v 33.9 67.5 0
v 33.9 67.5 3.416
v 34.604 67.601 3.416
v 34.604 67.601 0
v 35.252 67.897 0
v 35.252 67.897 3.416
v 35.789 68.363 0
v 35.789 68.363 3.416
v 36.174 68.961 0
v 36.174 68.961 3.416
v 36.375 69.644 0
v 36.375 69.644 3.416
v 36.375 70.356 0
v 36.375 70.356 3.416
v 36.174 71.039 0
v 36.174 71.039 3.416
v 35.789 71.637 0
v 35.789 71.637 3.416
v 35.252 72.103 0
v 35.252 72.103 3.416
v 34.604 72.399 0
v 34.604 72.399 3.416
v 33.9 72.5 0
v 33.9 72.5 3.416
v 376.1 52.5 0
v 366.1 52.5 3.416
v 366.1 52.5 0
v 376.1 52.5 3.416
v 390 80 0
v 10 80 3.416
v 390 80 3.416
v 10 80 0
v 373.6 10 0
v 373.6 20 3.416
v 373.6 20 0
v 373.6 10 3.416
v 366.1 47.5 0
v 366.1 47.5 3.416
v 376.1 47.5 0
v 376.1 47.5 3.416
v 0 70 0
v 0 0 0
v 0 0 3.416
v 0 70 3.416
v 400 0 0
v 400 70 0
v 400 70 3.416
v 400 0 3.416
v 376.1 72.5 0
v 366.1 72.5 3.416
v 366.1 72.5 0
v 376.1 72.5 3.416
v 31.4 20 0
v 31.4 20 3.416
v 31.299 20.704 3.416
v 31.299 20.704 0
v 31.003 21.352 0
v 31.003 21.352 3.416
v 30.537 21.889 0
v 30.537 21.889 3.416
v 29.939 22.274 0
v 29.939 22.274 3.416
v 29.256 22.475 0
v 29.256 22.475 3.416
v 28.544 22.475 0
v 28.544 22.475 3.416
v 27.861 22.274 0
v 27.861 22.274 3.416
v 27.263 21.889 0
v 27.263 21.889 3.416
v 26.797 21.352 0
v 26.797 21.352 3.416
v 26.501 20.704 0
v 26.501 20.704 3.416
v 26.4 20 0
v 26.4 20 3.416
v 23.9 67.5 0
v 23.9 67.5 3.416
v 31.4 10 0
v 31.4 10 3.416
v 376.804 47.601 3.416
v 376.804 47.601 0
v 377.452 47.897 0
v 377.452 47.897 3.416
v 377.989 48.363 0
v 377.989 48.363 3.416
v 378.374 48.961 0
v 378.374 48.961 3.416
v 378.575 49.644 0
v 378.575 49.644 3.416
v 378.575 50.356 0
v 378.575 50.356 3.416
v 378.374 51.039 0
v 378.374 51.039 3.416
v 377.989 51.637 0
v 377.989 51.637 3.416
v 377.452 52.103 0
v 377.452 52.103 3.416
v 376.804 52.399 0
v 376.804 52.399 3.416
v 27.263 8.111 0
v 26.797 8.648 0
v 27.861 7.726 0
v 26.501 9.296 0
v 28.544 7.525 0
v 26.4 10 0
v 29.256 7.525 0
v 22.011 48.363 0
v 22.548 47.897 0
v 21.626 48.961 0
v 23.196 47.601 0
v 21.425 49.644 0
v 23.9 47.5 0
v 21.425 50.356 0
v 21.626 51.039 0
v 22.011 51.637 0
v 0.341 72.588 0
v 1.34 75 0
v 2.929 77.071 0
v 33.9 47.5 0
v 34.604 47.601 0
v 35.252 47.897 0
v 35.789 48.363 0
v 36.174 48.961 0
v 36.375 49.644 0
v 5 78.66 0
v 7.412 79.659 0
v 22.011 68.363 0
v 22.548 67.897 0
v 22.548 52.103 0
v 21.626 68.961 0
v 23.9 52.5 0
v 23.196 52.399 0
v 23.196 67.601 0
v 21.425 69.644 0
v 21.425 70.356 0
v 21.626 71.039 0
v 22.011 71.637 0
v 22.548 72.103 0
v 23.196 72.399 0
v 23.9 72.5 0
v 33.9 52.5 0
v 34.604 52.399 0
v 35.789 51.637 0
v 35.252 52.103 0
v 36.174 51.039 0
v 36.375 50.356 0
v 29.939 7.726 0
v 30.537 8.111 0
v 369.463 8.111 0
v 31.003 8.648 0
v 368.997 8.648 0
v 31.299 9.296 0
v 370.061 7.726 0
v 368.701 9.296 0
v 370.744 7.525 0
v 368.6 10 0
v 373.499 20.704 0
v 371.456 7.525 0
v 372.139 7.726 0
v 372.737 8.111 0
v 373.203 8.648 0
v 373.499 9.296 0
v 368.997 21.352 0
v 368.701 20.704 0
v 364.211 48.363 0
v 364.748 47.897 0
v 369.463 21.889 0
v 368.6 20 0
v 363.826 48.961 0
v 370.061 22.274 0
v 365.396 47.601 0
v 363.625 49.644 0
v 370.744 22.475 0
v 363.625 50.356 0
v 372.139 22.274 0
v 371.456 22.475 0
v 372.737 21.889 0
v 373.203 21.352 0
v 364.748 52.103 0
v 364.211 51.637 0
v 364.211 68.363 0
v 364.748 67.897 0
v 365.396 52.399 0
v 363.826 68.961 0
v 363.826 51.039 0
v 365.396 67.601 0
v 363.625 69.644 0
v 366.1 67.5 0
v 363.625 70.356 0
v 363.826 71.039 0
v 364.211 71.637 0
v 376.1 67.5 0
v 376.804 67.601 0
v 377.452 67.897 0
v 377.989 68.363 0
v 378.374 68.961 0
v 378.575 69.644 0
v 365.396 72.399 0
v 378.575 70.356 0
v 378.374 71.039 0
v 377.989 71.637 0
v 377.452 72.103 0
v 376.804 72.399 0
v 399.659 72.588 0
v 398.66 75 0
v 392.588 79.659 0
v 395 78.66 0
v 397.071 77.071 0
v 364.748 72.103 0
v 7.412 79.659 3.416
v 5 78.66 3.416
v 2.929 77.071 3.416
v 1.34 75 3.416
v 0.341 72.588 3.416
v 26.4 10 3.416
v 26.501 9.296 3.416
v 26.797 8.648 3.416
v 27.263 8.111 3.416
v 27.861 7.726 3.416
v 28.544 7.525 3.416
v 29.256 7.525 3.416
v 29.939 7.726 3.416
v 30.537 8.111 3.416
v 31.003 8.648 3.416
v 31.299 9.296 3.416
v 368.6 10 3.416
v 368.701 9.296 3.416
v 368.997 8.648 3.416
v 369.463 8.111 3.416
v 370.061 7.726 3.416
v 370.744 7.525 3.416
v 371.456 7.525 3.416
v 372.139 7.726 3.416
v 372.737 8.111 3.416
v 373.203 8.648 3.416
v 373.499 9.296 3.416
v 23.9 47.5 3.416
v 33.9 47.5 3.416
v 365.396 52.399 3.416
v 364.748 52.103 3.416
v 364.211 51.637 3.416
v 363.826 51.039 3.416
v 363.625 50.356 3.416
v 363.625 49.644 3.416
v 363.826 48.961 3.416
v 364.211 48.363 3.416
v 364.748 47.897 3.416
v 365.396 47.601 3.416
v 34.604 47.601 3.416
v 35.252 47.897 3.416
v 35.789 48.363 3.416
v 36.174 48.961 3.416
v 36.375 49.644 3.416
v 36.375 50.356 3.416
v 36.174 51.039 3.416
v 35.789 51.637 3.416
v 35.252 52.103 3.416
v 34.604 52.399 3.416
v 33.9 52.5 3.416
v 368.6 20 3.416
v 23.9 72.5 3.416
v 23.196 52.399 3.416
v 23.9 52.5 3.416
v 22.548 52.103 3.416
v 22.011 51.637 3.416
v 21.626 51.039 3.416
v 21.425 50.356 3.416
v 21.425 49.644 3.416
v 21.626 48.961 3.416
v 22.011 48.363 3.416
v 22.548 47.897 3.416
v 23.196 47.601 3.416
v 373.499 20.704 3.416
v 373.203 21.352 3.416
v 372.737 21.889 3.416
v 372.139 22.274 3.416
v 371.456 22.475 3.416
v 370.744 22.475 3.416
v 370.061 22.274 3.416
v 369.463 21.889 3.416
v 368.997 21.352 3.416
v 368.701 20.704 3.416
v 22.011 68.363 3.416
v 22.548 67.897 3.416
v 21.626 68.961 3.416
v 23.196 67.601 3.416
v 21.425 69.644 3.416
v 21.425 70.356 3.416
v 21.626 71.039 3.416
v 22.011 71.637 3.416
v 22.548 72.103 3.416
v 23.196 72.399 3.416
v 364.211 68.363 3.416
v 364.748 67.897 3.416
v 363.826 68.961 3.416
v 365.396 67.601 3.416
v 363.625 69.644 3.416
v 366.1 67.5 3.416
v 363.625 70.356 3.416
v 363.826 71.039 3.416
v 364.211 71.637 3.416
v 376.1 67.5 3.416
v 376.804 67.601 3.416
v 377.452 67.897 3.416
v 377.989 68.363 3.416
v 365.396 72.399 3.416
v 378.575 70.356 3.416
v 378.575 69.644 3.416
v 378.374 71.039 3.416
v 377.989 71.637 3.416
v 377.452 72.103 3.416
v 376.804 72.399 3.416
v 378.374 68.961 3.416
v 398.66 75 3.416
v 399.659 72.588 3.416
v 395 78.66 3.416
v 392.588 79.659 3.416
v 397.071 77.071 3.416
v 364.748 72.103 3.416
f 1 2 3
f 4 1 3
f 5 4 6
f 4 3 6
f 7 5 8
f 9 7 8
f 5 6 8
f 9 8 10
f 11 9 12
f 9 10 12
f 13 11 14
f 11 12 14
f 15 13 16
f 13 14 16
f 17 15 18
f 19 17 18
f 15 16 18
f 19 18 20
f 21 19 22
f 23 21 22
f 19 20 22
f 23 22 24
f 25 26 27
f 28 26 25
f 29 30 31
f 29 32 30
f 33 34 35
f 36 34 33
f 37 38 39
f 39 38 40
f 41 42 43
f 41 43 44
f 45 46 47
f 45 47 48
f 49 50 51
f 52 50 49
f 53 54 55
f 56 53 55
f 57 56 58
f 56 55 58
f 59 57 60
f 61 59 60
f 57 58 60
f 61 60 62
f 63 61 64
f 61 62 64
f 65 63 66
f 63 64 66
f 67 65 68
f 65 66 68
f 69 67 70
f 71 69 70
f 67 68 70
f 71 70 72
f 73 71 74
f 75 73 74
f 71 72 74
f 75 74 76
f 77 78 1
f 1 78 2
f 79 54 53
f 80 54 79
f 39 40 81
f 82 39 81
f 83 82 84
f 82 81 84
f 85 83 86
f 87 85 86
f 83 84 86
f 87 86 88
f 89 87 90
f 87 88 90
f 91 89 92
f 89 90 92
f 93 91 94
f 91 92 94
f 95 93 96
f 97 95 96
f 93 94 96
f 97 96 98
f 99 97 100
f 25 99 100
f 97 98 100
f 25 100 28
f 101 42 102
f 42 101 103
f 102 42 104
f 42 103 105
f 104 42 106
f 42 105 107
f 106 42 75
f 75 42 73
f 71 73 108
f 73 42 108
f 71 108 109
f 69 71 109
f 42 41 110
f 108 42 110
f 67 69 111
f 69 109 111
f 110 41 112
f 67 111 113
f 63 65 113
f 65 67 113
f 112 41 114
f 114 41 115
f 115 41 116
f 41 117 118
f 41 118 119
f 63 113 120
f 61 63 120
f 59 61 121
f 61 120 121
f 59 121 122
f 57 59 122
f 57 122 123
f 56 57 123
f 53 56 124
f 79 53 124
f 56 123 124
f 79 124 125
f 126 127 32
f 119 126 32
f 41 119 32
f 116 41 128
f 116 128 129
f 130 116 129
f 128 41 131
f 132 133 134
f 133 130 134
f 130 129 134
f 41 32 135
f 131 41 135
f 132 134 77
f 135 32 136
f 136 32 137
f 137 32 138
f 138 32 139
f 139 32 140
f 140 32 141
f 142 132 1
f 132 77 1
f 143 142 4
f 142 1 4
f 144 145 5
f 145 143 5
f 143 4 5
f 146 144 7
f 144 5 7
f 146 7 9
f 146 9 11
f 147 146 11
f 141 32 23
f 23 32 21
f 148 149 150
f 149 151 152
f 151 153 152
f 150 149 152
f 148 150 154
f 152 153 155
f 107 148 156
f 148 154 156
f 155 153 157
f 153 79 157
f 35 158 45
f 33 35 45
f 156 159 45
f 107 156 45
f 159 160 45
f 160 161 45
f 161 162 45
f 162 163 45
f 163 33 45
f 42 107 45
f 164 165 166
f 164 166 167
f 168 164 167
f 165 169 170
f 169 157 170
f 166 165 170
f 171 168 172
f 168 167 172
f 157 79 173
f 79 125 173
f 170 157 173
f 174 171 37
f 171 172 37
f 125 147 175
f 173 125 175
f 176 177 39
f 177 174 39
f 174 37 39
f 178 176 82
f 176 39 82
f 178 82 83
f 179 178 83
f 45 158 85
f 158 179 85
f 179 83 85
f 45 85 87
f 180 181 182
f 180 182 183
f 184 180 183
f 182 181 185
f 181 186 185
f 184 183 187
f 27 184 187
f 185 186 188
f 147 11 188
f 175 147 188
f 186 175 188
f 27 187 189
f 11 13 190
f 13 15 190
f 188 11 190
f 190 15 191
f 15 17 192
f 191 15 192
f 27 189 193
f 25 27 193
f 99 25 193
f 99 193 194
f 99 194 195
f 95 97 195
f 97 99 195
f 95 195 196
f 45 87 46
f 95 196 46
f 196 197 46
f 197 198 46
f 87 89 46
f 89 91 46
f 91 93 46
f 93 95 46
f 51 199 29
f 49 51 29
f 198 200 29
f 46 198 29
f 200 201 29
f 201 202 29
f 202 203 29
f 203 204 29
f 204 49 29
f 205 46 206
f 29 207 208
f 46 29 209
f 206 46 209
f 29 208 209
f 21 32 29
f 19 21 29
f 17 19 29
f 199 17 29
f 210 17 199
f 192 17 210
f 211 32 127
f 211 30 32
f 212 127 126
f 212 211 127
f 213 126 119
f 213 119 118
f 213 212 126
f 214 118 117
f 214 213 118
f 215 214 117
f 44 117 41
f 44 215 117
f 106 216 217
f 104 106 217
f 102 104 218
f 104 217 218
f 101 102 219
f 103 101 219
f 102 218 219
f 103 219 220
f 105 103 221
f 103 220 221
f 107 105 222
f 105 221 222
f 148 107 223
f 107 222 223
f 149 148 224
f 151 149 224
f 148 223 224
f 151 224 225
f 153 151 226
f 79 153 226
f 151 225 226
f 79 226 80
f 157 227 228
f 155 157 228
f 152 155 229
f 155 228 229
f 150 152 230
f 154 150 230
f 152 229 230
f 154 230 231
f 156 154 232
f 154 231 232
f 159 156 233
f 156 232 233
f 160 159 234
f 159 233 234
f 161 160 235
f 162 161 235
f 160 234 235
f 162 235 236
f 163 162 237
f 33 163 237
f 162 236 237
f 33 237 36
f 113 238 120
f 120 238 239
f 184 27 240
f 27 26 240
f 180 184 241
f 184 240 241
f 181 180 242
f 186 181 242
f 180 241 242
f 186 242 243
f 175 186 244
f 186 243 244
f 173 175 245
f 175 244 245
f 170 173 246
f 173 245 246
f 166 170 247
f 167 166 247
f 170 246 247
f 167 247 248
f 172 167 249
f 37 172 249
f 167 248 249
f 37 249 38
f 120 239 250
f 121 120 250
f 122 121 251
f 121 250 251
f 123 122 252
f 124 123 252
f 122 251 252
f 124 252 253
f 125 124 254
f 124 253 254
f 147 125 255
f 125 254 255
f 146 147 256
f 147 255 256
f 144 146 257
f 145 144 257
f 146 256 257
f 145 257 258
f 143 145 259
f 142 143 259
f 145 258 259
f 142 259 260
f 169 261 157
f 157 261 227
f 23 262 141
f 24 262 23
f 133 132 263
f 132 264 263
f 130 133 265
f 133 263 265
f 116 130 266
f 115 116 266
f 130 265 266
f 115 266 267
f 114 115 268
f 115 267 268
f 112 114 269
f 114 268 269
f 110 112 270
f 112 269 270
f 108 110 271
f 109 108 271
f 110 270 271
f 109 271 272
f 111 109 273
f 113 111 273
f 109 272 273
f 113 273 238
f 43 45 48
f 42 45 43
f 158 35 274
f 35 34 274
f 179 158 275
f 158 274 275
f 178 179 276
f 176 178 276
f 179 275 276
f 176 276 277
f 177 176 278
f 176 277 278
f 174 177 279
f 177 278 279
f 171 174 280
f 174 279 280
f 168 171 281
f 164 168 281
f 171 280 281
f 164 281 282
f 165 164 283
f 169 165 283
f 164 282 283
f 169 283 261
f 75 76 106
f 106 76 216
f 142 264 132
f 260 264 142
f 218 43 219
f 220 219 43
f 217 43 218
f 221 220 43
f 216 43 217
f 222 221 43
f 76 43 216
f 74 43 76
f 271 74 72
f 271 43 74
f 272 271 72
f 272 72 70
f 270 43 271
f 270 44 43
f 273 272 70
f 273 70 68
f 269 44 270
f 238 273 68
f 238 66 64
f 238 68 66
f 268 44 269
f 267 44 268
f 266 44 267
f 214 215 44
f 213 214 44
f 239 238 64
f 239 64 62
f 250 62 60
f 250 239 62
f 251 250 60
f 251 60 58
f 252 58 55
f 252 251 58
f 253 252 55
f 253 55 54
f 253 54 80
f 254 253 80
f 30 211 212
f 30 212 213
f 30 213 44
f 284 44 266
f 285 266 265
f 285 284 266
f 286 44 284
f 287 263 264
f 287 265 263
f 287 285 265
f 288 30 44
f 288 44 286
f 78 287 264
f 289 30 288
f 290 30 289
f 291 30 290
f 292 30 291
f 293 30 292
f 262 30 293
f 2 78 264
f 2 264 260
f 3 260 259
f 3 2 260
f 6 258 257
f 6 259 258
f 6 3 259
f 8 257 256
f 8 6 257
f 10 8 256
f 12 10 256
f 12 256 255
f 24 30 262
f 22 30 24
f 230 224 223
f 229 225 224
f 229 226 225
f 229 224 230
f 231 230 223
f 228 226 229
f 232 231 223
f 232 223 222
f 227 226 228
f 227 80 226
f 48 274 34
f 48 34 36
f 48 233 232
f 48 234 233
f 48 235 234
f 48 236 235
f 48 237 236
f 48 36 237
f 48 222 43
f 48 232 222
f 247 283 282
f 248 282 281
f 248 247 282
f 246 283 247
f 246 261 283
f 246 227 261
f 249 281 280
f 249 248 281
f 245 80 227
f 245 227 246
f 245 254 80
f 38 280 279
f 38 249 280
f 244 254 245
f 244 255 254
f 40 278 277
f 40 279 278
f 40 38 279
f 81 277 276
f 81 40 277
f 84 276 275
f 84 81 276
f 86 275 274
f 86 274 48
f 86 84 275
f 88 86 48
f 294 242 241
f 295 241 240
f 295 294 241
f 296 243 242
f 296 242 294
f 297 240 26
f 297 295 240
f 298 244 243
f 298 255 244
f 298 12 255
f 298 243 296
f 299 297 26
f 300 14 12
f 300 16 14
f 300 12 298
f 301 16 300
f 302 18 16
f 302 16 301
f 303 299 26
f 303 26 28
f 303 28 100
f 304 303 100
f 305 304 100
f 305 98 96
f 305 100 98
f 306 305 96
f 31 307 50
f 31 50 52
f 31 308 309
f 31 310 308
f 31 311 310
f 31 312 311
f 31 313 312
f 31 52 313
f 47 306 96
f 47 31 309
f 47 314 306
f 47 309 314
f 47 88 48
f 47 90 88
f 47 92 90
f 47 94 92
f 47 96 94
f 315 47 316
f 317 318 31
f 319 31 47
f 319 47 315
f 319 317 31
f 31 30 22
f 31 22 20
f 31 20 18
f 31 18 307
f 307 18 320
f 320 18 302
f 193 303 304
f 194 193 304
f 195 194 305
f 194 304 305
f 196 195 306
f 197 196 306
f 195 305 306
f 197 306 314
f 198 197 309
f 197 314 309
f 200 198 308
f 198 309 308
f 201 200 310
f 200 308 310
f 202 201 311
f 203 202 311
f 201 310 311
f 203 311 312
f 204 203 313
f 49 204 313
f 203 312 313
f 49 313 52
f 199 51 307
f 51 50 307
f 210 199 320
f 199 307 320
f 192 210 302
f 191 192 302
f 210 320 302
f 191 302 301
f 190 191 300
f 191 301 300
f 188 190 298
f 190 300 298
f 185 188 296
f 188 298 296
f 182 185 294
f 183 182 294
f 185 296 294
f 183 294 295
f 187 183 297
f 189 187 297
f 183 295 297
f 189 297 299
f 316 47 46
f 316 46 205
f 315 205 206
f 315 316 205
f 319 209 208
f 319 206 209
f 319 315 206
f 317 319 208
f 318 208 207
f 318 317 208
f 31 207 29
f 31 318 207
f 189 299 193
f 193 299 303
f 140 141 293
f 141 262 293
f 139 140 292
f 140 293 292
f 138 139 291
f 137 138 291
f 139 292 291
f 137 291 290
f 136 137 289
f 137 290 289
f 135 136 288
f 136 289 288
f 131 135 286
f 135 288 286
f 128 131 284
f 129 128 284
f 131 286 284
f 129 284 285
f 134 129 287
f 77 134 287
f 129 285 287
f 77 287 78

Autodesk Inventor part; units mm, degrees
ref_plane "YZ Plane" through (0, 0, 0) normal (1, 0, 0) x (0, 1, 0)
ref_plane "XZ Plane" through (0, 0, 0) normal (0, 1, 0) x (-1, 0, 0)
ref_plane "XY Plane" through (0, 0, 0) normal (0, 0, 1) x (1, 0, 0)
sketch "Sketch1" plane through (0, 0, 0) normal (0, 0, 1) x (1, 0, 0)
  line L0 (0, 80) -> (400, 80)
  line L1 (400, 80) -> (400, 0)
  line L2 (400, 0) -> (0, 0)
  line L3 (0, 0) -> (0, 80)
  dimension "d0" = 80
  dimension "d1" = 400
extrude "Extrusion1" add sketch "Sketch1" along normal blind 3.4163
sketch "Sketch2" plane through (0, 0, 3.4163) normal (0, 0, 1) x (1, 0, 0)
  line L0 (0, 80) -> (400, 80) projected
  arc A0 (23.9, 72.5) -> (23.9, 67.5) centre (23.9, 70) ccw
  arc A1 (33.9, 67.5) -> (33.9, 72.5) centre (33.9, 70) ccw
  line L1 (23.9, 72.5) -> (33.9, 72.5)
  line L2 (23.9, 67.5) -> (33.9, 67.5)
  dimension "d7" = 5
  dimension "d8" = 10
  dimension "d9" = 5
  dimension "d10" = 10
extrude "Extrusion2" cut sketch "Sketch2" against normal through all
pattern_linear "Rectangular Pattern1" count 2 spacing 342.2 along (1, 0, 0) count 2 spacing 20 along (0, -1, 0) of "Extrusion2"
fillet "Fillet1" radius 10 2 edges at (400, 80, 1.7082) (0, 80, 1.7082)
sketch "Sketch3" plane through (0, 0, 3.4163) normal (0, 0, 1) x (1, 0, 0)
  line L0 (0, 0) -> (0, 70) projected
  line L1 (400, 0) -> (0, 0) projected
  arc A0 (31.4, 20) -> (26.4, 20) centre (28.9, 20) ccw
  arc A1 (26.4, 10) -> (31.4, 10) centre (28.9, 10) ccw
  line L2 (26.4, 20) -> (26.4, 10)
  line L3 (31.4, 20) -> (31.4, 10)
  dimension "d22" = 5
  dimension "d23" = 5
  dimension "d24" = 10
  dimension "d25" = 10
  dimension "d26" = 28.9
  dimension "d27" = 28.9
extrude "Extrusion3" cut sketch "Sketch3" against normal through all
pattern_linear "Rectangular Pattern2" count 2 spacing 342.2 along (1, 0, 0) of "Extrusion3"
equation "\"d8\" = d6"
equation "\"d10\" = d6"
equation "\"d23\" = d22"
equation "\"d27\" = d26"
equation "\"d6\" = 10"
properties part number "SM-S02" material "Steel, Mild"
